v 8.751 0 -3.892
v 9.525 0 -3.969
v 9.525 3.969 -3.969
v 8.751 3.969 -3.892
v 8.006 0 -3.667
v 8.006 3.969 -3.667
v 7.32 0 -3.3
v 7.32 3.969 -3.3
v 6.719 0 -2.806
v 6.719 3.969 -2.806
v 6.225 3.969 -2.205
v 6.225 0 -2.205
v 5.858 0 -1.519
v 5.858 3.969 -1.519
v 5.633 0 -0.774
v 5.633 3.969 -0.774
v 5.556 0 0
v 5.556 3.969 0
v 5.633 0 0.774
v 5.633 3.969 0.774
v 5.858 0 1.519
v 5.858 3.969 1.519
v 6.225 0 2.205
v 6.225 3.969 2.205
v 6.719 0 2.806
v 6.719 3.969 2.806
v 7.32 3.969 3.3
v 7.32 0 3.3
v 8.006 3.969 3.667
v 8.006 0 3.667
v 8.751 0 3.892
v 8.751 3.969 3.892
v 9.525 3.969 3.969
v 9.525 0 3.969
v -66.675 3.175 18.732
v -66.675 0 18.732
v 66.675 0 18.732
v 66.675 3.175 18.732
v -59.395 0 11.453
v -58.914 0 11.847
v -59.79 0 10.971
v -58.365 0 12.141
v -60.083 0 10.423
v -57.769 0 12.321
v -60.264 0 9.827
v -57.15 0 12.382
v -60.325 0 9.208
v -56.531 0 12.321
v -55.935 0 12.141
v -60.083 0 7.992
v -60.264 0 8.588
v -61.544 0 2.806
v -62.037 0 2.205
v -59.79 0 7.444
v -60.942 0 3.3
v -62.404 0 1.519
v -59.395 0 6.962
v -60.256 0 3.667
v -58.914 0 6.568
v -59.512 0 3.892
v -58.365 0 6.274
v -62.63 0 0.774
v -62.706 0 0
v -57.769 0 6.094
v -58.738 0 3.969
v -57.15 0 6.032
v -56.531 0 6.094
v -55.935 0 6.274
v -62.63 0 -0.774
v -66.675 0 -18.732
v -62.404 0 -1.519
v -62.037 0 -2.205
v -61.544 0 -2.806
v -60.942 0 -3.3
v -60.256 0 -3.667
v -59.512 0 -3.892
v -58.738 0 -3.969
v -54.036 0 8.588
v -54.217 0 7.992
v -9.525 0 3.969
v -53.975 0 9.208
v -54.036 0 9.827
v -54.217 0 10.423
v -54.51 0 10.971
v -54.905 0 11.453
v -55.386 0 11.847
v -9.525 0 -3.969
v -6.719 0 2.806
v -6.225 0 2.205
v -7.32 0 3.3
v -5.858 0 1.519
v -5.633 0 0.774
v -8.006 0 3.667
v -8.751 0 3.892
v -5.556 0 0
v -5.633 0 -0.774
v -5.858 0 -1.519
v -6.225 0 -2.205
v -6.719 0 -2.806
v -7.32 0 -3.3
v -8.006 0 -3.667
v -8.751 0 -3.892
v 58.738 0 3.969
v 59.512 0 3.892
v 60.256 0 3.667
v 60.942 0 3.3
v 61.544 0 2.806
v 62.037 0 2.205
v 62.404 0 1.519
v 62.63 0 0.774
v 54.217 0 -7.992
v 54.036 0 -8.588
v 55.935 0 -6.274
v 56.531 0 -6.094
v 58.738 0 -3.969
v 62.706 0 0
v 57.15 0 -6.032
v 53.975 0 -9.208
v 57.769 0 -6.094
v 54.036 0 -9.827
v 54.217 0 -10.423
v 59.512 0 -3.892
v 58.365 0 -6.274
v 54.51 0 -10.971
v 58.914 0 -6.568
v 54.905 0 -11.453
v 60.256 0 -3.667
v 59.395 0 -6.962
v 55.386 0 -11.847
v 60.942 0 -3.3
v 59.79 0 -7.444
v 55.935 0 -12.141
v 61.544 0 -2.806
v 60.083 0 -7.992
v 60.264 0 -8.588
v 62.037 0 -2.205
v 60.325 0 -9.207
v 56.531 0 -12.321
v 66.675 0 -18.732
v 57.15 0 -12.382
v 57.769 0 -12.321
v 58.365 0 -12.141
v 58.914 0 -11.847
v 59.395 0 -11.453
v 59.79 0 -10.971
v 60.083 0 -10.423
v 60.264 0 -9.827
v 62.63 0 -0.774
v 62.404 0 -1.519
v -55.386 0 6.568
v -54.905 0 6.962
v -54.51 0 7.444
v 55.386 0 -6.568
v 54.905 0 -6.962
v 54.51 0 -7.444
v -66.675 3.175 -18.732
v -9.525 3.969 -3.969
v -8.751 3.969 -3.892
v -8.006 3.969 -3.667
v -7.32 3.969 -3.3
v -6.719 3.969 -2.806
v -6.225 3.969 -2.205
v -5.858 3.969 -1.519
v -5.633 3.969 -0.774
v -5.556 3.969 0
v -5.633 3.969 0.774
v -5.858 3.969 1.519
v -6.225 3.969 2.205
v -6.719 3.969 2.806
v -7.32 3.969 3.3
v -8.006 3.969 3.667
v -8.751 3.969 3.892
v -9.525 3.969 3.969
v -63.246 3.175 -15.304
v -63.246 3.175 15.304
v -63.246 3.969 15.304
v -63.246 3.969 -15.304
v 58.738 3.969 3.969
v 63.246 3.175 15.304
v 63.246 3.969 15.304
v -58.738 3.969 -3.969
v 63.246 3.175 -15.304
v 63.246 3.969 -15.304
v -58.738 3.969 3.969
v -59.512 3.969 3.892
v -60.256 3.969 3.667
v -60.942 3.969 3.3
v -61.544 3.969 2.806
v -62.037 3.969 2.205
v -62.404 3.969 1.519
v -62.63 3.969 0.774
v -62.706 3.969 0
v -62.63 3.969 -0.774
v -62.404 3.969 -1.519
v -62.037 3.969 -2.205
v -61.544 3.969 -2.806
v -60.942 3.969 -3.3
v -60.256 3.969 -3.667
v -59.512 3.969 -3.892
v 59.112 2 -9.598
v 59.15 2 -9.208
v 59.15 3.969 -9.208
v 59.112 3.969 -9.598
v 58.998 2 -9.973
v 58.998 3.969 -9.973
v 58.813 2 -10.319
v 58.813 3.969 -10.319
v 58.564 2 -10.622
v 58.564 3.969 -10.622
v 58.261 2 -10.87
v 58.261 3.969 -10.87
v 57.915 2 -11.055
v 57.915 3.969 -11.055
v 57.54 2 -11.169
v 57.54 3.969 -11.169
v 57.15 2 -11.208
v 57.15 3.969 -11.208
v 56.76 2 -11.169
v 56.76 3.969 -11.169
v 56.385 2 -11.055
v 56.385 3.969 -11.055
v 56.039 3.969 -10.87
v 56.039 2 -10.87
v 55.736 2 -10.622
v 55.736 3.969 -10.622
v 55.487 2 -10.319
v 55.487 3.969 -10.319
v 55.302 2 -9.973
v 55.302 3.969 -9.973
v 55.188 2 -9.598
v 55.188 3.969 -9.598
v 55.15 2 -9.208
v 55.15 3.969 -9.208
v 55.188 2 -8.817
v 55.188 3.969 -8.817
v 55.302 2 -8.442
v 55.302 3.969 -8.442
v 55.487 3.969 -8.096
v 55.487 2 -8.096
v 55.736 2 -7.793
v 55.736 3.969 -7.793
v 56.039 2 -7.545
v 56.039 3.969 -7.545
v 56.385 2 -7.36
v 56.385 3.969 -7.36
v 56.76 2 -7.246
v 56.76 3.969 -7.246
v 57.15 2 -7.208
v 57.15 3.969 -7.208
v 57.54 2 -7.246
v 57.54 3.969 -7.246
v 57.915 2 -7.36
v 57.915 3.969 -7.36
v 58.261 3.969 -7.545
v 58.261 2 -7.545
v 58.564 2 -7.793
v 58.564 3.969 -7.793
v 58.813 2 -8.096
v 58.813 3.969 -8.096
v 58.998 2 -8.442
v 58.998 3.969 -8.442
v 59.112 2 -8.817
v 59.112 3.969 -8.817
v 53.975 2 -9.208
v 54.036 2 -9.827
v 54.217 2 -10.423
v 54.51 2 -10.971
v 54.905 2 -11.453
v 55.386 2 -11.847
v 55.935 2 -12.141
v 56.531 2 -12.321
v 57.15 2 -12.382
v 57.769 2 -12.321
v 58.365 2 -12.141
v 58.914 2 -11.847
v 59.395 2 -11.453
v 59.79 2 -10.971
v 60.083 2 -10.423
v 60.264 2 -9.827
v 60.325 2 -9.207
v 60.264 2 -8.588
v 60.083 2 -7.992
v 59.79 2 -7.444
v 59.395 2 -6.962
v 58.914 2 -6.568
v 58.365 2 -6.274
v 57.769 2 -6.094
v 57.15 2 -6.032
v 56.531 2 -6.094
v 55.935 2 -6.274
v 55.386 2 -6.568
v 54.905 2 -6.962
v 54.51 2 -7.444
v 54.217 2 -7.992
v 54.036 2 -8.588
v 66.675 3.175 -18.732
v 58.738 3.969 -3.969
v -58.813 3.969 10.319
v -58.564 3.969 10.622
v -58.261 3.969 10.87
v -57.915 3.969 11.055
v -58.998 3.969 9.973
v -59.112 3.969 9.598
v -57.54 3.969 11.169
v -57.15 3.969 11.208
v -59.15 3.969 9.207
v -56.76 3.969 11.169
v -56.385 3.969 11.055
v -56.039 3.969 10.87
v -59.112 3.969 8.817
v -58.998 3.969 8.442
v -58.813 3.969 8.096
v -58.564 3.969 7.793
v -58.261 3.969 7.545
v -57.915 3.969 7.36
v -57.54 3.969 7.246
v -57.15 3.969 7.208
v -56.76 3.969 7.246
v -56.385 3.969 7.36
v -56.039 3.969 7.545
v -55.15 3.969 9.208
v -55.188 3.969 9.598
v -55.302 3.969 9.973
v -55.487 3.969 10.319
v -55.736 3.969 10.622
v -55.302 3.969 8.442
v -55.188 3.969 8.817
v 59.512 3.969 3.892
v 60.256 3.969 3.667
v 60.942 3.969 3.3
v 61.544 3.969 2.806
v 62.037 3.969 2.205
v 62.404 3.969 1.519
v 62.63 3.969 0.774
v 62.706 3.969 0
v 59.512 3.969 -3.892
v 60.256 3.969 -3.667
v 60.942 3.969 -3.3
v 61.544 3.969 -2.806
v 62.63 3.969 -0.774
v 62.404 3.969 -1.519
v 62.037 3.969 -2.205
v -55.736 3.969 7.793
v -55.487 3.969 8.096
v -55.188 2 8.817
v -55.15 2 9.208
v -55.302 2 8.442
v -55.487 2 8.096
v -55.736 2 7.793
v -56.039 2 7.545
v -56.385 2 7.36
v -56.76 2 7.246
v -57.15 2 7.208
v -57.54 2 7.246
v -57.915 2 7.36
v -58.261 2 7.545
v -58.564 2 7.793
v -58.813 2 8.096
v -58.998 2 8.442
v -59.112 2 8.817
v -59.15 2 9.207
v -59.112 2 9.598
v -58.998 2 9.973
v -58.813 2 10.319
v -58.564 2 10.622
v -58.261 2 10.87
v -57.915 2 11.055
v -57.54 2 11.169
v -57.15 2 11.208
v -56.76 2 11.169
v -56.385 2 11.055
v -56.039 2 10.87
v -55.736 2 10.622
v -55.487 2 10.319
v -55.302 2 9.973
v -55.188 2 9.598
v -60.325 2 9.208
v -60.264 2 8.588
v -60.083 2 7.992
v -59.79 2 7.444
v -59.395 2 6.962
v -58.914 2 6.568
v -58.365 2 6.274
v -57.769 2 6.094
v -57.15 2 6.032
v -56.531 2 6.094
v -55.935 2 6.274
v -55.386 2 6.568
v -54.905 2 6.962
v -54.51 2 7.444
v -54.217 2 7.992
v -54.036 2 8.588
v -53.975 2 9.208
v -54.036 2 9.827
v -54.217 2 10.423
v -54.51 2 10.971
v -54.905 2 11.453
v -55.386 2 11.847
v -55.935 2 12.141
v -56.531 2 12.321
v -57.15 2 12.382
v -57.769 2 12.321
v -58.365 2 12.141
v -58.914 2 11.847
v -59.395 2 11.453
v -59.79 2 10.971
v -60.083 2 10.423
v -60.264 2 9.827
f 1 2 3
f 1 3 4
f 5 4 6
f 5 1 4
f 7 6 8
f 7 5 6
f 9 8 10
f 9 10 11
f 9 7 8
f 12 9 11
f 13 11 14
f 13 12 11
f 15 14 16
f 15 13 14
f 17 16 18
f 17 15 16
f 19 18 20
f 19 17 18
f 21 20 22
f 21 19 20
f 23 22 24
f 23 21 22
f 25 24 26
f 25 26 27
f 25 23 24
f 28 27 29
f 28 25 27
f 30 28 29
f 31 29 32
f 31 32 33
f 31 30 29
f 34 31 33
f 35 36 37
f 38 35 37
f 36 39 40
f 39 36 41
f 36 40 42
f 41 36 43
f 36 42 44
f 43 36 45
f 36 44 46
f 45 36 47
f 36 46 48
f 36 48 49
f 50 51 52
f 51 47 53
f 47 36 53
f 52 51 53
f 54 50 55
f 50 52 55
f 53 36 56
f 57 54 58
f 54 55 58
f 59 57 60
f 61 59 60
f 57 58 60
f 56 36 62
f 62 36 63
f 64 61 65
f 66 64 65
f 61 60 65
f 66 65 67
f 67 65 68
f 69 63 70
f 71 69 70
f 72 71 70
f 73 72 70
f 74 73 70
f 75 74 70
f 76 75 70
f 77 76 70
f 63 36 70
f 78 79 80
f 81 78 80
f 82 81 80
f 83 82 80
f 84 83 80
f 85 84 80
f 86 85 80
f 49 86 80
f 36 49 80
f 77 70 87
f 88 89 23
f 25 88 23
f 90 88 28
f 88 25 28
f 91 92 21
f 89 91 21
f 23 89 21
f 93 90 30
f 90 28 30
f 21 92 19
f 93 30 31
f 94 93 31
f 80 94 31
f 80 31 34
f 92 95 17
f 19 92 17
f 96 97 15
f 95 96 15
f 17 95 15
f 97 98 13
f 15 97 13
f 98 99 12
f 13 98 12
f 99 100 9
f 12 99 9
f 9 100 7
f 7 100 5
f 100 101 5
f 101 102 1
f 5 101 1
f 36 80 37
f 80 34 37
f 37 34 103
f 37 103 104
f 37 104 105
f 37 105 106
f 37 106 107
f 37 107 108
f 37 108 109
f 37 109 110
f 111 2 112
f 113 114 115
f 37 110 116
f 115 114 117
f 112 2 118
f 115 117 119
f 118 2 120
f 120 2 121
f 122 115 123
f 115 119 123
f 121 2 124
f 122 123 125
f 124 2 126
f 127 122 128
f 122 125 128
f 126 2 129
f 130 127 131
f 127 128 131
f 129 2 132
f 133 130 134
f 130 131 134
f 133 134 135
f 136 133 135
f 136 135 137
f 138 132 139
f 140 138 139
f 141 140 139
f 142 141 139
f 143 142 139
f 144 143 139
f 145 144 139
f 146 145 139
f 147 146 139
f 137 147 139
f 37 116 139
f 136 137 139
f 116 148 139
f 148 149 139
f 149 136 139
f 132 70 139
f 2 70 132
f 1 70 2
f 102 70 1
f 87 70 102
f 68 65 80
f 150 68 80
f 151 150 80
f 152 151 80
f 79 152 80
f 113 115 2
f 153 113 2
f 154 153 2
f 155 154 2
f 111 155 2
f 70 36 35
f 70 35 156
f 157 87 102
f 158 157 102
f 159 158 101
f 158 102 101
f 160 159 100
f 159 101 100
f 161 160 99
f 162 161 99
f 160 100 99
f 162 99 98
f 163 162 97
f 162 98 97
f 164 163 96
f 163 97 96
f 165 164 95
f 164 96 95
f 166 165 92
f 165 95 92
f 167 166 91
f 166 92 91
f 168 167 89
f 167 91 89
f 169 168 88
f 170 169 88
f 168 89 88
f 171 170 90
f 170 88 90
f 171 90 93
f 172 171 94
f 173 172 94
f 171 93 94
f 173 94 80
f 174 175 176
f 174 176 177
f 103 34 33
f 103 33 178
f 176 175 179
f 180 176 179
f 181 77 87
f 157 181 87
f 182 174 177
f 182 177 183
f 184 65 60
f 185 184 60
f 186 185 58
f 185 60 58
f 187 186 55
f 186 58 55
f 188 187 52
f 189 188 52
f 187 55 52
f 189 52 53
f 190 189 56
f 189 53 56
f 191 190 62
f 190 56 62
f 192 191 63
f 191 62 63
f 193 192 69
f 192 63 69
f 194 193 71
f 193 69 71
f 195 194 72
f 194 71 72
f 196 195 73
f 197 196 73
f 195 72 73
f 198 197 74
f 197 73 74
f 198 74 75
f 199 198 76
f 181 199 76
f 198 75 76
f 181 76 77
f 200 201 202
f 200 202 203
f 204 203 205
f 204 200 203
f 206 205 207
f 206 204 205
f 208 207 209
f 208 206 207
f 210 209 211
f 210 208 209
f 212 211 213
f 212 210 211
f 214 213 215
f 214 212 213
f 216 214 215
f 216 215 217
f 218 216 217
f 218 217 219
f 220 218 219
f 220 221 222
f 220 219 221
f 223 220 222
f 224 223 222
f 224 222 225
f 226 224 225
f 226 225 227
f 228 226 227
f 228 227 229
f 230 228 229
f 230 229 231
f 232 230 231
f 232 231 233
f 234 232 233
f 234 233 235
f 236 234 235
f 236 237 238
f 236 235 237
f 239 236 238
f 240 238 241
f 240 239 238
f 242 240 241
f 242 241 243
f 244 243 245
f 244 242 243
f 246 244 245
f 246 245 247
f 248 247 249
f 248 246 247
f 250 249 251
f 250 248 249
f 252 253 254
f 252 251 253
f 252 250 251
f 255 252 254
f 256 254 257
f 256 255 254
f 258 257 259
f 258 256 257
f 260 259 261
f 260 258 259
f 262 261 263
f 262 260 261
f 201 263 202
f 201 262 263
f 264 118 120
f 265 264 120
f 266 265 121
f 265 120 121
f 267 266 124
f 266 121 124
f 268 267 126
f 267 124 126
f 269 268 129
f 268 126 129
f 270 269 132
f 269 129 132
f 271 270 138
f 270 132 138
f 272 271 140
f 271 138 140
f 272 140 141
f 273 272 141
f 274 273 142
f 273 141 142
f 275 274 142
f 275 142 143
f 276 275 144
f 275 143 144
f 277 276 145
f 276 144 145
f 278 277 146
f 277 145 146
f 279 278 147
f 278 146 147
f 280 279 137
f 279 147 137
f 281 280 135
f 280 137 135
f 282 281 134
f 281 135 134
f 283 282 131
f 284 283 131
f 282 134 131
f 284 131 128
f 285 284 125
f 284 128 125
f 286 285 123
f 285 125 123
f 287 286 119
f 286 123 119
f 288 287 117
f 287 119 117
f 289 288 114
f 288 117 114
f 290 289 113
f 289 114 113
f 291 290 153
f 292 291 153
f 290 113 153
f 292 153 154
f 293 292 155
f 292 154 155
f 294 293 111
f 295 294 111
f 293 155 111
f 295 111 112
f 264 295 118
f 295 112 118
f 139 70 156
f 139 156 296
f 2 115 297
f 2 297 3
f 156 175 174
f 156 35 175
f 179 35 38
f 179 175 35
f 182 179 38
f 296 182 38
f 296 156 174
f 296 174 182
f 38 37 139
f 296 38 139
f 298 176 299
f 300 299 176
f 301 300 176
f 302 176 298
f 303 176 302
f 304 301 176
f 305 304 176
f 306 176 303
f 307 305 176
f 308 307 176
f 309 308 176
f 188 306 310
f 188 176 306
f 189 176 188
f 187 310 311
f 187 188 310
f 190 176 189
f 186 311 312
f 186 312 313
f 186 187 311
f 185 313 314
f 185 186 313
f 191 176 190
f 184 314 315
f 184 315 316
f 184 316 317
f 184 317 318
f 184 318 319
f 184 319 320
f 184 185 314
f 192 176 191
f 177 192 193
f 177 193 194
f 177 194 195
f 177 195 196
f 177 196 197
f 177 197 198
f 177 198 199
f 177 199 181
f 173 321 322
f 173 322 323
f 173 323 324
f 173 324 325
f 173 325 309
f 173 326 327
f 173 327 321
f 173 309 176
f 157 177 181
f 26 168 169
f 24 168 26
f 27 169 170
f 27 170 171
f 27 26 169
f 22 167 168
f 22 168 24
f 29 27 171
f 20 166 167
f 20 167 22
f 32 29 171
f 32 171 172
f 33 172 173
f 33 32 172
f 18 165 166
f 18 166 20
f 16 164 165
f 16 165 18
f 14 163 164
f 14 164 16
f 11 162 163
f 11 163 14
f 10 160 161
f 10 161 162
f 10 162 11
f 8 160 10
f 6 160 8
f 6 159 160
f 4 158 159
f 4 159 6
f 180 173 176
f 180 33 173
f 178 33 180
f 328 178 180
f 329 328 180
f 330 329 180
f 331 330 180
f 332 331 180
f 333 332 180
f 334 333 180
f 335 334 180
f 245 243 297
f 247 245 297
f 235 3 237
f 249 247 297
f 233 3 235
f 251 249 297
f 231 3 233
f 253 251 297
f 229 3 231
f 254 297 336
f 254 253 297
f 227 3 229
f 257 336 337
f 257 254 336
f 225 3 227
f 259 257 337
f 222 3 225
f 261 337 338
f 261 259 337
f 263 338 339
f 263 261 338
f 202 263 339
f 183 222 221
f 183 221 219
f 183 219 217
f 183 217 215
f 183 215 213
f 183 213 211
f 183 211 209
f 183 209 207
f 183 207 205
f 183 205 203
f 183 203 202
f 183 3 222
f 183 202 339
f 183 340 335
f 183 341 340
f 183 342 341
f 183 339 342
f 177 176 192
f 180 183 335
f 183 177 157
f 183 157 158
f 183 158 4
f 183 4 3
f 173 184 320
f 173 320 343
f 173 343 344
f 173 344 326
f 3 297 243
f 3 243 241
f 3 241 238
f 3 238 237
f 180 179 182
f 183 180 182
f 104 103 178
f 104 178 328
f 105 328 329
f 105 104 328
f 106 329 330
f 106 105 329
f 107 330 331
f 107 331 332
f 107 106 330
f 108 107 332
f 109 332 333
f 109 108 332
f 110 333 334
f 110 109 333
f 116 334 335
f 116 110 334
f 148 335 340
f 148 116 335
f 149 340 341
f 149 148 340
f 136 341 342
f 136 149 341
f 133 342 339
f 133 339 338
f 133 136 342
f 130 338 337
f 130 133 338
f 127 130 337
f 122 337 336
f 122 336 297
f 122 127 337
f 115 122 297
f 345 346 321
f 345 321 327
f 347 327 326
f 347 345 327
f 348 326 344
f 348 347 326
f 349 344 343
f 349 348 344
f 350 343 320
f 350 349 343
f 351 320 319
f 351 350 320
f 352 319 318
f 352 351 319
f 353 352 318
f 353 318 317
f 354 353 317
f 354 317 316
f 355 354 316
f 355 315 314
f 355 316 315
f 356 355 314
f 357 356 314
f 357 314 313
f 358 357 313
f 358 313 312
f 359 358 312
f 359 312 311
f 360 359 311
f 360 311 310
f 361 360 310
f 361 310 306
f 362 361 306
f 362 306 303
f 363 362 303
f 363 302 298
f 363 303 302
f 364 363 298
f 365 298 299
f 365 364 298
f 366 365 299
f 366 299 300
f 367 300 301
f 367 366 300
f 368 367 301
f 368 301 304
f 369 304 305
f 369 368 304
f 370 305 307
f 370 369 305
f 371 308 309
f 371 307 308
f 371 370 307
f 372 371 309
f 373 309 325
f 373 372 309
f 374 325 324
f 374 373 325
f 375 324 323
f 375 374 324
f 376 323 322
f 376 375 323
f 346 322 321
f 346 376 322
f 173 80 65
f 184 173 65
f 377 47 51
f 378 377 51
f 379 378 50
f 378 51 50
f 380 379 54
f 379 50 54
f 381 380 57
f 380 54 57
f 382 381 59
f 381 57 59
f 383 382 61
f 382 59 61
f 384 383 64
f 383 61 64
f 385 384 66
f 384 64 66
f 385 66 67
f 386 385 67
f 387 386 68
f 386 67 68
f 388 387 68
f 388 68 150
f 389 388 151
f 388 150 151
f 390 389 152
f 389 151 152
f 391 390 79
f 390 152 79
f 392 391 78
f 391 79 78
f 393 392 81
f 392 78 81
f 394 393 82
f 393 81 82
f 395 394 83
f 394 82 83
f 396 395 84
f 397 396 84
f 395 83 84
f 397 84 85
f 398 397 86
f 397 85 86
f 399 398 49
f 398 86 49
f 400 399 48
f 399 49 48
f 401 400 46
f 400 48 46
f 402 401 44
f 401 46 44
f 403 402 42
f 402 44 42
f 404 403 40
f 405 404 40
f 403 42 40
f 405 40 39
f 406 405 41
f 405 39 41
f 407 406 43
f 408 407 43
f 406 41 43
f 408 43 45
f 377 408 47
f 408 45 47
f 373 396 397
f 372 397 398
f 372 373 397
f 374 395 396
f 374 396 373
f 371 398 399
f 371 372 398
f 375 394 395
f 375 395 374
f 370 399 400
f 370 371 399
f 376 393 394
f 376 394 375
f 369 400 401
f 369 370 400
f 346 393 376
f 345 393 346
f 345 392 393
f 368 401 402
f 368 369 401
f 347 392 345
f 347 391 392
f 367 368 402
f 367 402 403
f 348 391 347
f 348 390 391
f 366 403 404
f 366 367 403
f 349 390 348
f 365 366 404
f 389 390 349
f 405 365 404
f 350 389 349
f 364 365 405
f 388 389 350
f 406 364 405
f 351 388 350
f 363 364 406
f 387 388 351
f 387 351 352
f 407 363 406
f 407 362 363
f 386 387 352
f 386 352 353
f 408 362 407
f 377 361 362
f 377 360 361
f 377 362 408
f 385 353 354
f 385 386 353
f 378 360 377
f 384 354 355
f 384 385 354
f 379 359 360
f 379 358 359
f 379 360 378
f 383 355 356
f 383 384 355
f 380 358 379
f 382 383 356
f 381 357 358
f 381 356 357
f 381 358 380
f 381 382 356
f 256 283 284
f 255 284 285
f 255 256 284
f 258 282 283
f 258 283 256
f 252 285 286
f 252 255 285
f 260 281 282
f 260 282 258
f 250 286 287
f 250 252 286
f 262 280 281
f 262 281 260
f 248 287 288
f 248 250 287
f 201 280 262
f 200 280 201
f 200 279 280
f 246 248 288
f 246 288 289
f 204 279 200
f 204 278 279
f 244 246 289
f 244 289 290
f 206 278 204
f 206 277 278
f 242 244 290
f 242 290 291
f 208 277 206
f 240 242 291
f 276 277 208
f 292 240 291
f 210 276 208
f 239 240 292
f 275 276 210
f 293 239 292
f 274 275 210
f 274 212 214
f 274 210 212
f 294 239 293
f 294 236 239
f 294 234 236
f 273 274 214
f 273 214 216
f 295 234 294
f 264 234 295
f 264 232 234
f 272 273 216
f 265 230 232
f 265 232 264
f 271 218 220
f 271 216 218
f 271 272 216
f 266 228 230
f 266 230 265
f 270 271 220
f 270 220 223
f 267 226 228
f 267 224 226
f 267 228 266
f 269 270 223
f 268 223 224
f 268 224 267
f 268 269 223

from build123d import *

# Parameters (mm, degrees)
SKETCH1_W           = 133.35
SKETCH1_H           = 37.465
BOSS_EXTRUDE1_DEPTH = 3.175
SKETCH2_W           = 126.492
SKETCH2_H           = 30.607
BOSS_EXTRUDE2_DEPTH = 0.79375
CUT_EXTRUDE1_DEPTH  = 3.96875
CUT_EXTRUDE2_REACH  = 5.969
SKETCH5_R           = 2
SKETCH6_R           = 3.175
CUT_EXTRUDE3_DEPTH  = 2


with BuildPart() as part:
    # Sketch1 → Boss-Extrude1 (new body)
    with BuildSketch(Plane(origin=(0, 0, 0), x_dir=(1, 0, 0), z_dir=(0, 1, 0))):
        Rectangle(SKETCH1_W, SKETCH1_H)
    extrude(amount=BOSS_EXTRUDE1_DEPTH)

    # Sketch2 → Boss-Extrude2 (add)
    with BuildSketch(Plane(origin=(0, 3.175, 0), x_dir=(1, 0, 0), z_dir=(0, 1, 0))):
        Rectangle(SKETCH2_W, SKETCH2_H)
    extrude(amount=BOSS_EXTRUDE2_DEPTH)

    # Sketch3 → Cut-Extrude1 (cut)
    with BuildSketch(Plane(origin=(0, 0, 0), x_dir=(1, 0, 0), z_dir=(0, 1, 0))):
        with BuildLine():
            Line((-9.525, -3.96875), (-58.7375, -3.96875))
            ThreePointArc((-58.7375, -3.96875), (-62.70625, 0), (-58.7375, 3.96875))
            Line((-58.7375, 3.96875), (-9.525, 3.96875))
            ThreePointArc((-9.525, 3.96875), (-5.55625, 0), (-9.525, -3.96875))
        make_face()
    cut_extrude1 = extrude(amount=CUT_EXTRUDE1_DEPTH, mode=Mode.SUBTRACT)

    # Mirror1: Cut-Extrude1 across plane
    add(cut_extrude1.mirror(Plane(origin=(0, 0, 0), x_dir=(0, 0, 1), z_dir=(1, 0, 0))), mode=Mode.SUBTRACT)

    # Sketch5 → Cut-Extrude2 (cut, up to next)
    with BuildSketch(Plane(origin=(0, 0, 0), x_dir=(1, 0, 0), z_dir=(0, 1, 0)), mode=Mode.PRIVATE) as cut_extrude2_sk1:
        with Locations((-57.15, -9.2075)):
            Circle(SKETCH5_R)
    cut_extrude2_tool1 = extrude(cut_extrude2_sk1.sketch, amount=CUT_EXTRUDE2_REACH, mode=Mode.PRIVATE) & part.part
    add(cut_extrude2_tool1.solids().sort_by_distance((-57.15, 0, 9.2075))[0], mode=Mode.SUBTRACT)
    # Sketch5 → Cut-Extrude2 (cut, up to next)
    with BuildSketch(Plane(origin=(0, 0, 0), x_dir=(1, 0, 0), z_dir=(0, 1, 0)), mode=Mode.PRIVATE) as cut_extrude2_sk2:
        with Locations((57.15, 9.2075)):
            Circle(SKETCH5_R)
    cut_extrude2_tool2 = extrude(cut_extrude2_sk2.sketch, amount=CUT_EXTRUDE2_REACH, mode=Mode.PRIVATE) & part.part
    add(cut_extrude2_tool2.solids().sort_by_distance((57.15, 0, -9.2075))[0], mode=Mode.SUBTRACT)

    # Sketch6 → Cut-Extrude3 (cut)
    with BuildSketch(Plane(origin=(0, 0, 0), x_dir=(-1, 0, 0), z_dir=(0, -1, 0))):
        with Locations((57.15, -9.2075)):
            Circle(SKETCH6_R)
        with Locations((-57.15, 9.2075)):
            Circle(SKETCH6_R)
    extrude(amount=-CUT_EXTRUDE3_DEPTH, mode=Mode.SUBTRACT)


solid = part.part
